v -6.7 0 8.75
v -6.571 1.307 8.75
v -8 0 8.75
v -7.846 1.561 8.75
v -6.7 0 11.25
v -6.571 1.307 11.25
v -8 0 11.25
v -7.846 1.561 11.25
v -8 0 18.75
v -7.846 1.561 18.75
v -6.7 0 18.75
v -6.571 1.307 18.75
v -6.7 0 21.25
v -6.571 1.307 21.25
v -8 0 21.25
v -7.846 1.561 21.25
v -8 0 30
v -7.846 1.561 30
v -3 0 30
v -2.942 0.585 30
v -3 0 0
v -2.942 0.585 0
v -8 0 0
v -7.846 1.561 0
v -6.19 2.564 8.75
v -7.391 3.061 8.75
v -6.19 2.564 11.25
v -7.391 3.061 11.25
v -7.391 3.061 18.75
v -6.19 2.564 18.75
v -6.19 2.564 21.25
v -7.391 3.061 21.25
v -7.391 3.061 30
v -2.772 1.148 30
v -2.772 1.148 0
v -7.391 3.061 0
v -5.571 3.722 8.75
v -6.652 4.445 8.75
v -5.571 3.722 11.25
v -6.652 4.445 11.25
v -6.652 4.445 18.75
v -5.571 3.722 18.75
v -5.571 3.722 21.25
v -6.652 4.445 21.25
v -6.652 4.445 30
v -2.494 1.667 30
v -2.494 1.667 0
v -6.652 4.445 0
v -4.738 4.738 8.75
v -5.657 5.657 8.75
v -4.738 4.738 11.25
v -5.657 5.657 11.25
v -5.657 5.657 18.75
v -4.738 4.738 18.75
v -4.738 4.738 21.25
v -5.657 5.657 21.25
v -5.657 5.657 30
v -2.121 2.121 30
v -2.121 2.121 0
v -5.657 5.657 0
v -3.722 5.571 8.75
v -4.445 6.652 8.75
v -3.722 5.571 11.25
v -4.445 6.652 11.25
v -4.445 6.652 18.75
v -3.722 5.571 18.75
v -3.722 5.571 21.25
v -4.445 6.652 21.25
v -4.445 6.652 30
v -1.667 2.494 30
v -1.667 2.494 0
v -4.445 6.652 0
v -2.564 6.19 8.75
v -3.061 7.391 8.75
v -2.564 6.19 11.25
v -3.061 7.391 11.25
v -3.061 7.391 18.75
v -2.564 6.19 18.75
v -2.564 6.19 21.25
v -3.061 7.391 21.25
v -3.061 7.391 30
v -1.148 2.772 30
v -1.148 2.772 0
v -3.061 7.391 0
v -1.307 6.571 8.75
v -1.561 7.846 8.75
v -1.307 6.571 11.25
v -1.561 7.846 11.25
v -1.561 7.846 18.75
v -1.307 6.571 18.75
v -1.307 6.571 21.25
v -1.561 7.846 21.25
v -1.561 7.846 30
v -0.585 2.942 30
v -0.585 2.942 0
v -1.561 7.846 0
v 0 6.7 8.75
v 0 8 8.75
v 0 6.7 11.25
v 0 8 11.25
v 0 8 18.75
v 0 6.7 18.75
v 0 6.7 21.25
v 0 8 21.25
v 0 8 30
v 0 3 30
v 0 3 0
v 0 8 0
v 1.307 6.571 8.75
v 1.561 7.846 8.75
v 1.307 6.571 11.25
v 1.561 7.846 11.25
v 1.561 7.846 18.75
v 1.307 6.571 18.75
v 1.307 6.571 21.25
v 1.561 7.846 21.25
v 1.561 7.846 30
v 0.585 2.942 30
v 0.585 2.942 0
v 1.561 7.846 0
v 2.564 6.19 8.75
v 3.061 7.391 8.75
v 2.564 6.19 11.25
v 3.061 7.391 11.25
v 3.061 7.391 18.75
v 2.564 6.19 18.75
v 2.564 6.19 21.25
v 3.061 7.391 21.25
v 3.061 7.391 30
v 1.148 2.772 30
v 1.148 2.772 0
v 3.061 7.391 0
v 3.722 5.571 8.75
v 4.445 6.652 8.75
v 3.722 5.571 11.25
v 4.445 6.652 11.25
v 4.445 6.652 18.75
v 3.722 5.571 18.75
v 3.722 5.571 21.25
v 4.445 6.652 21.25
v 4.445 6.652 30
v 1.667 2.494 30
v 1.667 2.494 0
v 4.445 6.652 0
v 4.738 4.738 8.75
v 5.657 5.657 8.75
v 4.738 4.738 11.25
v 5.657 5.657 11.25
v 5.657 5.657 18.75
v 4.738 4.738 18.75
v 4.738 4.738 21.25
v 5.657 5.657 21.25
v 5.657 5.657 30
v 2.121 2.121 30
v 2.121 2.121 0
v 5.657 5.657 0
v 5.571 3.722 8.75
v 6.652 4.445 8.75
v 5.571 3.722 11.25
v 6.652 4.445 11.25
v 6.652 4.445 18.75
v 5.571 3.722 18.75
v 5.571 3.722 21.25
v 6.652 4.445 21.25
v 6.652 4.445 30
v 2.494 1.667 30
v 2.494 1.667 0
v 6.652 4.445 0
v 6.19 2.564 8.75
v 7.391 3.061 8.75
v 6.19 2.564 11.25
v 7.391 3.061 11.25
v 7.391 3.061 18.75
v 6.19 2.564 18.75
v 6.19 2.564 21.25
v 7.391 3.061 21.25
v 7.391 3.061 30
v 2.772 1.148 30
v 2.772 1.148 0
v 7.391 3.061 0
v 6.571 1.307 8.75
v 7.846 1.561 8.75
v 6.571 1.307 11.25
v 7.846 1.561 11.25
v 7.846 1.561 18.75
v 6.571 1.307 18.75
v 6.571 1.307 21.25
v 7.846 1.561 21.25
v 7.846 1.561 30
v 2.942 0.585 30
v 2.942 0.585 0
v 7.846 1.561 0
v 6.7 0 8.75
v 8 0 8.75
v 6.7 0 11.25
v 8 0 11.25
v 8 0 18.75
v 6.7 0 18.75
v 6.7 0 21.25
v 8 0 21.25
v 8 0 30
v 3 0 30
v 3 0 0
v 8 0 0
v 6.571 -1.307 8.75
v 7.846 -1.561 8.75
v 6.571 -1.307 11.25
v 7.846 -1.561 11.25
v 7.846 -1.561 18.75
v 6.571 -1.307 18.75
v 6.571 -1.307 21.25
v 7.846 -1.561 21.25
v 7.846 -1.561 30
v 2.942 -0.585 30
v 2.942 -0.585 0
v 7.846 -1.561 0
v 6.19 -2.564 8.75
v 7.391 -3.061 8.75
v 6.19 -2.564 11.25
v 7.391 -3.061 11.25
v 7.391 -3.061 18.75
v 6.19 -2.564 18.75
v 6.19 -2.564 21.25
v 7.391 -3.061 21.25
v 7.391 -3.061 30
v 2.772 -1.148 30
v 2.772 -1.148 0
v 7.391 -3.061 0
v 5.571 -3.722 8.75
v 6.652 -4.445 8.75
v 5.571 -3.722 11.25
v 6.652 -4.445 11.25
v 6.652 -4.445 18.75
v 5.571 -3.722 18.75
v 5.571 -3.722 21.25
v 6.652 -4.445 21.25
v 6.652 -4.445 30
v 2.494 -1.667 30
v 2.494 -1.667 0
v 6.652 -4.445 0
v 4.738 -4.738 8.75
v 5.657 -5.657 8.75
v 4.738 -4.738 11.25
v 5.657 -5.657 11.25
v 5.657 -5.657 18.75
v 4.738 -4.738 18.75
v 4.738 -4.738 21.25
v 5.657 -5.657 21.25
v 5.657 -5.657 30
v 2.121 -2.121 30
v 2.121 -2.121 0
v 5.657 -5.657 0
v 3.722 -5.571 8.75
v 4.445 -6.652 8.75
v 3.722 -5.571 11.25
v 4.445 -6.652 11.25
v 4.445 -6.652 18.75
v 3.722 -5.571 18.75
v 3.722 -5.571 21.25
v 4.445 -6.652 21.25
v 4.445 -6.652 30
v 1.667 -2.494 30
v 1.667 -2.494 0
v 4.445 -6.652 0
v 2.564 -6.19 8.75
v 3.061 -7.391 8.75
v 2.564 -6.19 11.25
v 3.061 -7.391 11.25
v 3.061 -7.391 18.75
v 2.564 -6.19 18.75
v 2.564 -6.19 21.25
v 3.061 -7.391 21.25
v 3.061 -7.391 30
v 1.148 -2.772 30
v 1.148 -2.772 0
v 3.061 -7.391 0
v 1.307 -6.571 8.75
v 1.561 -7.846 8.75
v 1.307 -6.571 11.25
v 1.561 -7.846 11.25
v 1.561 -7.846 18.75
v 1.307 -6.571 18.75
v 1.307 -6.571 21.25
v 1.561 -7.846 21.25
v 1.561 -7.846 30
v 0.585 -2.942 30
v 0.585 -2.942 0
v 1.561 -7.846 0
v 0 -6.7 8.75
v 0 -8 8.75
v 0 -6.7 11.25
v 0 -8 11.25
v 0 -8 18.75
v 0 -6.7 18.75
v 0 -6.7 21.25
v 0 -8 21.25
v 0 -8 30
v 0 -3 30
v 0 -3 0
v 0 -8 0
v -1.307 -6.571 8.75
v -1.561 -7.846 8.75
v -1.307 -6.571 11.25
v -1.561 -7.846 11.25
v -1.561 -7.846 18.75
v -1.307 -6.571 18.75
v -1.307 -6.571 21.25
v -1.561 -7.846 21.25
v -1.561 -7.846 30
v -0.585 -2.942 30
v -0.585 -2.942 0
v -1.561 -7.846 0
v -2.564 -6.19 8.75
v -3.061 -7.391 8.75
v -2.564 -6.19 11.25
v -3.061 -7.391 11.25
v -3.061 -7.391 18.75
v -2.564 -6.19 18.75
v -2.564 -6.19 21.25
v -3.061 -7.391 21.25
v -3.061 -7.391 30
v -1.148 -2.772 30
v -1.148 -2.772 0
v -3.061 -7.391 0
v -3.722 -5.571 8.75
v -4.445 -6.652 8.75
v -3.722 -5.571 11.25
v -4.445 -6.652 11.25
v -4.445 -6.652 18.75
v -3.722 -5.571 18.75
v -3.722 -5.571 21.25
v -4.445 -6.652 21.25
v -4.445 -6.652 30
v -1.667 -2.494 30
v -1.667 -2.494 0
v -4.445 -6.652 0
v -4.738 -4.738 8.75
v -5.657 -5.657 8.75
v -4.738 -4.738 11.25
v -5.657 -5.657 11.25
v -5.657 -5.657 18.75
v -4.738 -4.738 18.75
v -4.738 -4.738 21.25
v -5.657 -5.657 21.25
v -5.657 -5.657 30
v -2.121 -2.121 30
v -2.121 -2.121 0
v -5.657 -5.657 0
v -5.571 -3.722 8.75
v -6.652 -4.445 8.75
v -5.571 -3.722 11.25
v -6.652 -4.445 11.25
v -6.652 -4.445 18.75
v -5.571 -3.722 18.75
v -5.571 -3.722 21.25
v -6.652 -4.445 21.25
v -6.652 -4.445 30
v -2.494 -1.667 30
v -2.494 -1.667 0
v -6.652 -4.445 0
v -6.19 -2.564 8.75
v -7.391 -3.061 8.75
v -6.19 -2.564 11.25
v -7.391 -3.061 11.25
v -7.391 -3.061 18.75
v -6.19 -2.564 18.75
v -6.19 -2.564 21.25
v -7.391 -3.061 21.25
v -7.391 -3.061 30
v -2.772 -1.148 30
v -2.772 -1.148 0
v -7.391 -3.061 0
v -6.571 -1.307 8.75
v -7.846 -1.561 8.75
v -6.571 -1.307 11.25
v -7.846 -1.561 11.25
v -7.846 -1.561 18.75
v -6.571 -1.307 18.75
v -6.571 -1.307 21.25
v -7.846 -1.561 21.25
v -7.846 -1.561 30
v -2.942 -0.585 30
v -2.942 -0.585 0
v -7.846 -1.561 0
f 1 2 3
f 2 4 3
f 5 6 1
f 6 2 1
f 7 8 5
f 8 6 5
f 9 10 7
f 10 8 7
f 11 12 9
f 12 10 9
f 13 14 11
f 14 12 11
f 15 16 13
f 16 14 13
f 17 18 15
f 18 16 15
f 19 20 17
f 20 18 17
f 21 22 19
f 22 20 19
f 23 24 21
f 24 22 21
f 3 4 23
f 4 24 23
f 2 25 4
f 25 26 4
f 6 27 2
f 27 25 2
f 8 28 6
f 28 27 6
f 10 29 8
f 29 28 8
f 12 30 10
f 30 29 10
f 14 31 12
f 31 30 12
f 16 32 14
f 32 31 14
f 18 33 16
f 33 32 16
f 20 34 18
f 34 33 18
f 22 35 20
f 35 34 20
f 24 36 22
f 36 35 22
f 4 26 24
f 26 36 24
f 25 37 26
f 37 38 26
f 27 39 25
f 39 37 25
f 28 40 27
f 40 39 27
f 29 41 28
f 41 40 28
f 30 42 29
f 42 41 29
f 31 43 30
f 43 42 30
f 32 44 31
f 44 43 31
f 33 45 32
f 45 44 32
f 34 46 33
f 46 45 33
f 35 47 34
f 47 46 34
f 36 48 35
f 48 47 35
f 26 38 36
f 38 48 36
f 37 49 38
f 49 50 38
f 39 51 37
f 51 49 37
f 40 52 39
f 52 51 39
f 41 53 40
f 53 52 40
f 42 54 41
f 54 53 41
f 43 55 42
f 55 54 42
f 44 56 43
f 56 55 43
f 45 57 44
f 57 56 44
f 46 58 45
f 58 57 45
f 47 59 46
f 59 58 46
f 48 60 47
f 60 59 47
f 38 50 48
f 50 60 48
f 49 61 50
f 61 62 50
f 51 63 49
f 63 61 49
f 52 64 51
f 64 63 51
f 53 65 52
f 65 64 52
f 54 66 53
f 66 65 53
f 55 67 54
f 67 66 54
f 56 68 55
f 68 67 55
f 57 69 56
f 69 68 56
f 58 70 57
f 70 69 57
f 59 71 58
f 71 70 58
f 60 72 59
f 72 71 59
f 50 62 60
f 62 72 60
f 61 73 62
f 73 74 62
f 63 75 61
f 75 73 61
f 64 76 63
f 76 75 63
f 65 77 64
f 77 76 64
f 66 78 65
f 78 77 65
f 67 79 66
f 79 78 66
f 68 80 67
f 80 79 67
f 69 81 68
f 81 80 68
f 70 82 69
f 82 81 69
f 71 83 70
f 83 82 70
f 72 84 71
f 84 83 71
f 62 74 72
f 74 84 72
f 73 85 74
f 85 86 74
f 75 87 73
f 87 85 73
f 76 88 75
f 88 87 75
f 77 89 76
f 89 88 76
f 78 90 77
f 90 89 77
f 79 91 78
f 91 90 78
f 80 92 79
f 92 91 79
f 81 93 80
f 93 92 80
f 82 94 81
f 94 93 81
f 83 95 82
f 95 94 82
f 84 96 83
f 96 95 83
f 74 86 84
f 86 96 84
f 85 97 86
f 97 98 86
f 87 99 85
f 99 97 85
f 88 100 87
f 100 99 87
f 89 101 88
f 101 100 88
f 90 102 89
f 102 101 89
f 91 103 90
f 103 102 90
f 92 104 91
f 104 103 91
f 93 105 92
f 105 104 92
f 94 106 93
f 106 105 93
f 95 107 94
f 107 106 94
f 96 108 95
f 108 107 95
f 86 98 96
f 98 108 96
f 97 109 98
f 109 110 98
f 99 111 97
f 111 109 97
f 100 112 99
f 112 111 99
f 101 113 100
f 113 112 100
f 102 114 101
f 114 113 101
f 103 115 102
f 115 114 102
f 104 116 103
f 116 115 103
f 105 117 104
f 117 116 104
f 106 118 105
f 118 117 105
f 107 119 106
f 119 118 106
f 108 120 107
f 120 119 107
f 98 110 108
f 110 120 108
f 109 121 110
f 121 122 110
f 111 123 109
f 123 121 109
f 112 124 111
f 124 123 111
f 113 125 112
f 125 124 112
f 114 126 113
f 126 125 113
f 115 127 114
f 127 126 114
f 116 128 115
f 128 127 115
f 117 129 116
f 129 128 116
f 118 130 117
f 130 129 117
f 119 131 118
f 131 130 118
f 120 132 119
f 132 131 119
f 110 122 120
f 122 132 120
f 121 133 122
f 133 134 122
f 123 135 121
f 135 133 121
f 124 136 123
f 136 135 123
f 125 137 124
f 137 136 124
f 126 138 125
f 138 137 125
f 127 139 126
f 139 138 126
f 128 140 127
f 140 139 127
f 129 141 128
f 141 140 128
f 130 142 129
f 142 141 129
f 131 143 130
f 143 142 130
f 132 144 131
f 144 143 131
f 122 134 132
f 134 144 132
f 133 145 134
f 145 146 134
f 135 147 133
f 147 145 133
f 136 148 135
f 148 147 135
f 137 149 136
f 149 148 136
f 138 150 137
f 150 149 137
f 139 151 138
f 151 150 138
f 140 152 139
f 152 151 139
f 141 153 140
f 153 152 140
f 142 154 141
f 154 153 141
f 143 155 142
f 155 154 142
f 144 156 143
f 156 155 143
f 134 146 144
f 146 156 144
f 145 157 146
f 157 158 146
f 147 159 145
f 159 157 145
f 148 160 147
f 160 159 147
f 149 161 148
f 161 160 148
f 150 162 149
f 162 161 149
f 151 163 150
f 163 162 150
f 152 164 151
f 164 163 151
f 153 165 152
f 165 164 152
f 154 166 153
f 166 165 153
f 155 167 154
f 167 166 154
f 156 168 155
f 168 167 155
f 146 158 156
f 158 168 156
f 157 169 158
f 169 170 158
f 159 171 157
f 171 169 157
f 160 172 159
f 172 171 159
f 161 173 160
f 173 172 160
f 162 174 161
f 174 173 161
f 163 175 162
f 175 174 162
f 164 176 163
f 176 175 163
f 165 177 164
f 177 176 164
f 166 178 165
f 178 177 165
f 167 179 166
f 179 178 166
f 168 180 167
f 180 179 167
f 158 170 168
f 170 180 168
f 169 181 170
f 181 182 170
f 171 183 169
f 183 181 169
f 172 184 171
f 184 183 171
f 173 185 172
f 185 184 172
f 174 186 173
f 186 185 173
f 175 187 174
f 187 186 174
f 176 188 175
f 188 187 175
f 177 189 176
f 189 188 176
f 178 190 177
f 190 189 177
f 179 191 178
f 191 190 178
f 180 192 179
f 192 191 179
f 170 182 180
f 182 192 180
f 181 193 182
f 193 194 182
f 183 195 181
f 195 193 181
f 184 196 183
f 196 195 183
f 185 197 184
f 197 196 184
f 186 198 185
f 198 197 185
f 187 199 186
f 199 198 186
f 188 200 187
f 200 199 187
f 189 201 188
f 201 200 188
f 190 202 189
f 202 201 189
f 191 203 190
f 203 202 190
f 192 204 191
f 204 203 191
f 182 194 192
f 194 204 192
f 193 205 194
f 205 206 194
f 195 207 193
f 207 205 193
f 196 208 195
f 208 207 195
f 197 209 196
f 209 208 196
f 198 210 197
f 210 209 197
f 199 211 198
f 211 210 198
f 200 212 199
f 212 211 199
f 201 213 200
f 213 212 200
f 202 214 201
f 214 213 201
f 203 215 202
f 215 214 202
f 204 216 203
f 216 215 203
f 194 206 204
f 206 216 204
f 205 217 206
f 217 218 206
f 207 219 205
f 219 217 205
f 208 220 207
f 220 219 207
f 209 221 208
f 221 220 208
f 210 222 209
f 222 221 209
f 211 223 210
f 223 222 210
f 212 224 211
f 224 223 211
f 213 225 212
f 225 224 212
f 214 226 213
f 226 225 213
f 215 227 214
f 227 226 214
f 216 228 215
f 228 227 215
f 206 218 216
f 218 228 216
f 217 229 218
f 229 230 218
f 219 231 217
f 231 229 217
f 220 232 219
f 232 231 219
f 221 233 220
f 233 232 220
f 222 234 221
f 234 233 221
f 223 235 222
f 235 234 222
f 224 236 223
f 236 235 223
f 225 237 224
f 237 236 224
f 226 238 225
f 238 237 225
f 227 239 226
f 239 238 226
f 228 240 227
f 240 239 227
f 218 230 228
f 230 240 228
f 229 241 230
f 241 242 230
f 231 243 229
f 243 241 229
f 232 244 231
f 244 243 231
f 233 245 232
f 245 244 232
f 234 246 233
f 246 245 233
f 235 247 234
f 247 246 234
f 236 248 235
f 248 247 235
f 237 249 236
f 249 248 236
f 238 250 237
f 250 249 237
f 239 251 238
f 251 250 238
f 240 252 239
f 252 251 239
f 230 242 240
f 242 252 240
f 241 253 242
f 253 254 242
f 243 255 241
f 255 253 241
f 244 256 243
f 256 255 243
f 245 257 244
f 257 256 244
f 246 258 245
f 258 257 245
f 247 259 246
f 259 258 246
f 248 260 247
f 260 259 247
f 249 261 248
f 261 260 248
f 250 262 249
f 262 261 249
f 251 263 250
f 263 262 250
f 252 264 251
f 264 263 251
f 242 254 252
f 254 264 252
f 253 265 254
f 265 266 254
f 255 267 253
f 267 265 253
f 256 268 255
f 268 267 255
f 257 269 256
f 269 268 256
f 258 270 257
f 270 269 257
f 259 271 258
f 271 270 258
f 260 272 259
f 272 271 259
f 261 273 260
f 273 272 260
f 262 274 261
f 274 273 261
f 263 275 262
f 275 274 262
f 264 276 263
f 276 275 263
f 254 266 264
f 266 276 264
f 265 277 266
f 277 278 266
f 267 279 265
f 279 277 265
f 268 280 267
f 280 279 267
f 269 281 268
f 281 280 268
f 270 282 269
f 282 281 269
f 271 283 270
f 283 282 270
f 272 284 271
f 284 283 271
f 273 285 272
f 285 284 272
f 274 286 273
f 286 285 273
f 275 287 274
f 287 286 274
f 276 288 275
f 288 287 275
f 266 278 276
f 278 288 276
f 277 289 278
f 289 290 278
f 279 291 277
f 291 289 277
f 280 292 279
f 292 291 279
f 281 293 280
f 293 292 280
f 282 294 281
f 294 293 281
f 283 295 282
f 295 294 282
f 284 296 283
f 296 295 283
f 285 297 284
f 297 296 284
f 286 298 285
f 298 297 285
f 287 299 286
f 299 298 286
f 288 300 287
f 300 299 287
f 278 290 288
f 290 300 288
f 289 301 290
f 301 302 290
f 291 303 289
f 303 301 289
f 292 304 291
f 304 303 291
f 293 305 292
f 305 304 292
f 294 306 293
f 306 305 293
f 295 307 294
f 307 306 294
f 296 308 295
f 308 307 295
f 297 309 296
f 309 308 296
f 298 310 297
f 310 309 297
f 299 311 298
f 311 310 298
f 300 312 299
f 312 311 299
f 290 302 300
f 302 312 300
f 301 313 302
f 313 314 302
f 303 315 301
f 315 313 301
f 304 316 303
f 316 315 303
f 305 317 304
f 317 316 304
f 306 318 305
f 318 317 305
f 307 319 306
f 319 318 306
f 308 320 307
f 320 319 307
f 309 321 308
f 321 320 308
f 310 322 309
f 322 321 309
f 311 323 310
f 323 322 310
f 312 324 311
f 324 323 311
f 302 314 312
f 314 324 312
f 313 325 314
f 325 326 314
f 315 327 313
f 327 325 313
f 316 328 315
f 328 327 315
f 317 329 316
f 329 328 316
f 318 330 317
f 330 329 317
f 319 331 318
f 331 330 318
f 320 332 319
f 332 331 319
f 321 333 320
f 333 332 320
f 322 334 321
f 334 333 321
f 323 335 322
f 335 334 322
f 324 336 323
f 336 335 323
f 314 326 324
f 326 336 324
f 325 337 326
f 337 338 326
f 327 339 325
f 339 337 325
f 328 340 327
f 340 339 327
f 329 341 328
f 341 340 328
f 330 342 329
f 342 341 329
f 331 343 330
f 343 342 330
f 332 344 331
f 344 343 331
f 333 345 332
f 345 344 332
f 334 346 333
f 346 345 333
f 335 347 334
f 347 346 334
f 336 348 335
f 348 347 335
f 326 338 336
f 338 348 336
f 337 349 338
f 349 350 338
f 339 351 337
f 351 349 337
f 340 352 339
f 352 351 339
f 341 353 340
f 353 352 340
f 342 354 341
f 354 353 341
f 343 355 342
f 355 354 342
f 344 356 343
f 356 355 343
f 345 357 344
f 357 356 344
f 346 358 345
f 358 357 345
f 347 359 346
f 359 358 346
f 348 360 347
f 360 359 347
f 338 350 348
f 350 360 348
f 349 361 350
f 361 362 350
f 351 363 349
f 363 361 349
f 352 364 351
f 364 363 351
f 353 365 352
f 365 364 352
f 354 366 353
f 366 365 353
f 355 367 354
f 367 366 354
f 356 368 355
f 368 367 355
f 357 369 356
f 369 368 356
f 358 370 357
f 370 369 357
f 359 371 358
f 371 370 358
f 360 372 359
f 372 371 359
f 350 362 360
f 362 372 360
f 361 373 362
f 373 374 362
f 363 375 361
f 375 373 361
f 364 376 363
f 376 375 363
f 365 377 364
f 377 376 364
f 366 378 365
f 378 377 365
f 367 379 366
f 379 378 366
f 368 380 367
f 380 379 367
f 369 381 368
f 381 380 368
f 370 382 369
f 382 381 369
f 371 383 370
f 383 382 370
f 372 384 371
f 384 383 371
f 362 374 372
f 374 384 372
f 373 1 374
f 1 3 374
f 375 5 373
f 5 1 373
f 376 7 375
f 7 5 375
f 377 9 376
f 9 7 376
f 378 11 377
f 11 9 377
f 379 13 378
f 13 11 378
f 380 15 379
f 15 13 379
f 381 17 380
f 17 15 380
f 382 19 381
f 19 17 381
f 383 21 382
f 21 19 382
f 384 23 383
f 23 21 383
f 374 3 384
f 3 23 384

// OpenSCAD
$fn = 32;

// ----------------------------------------------------------------------
// Grooved revolve: stepped, bore R3
// ----------------------------------------------------------------------

// --- parameters (mm) ---
bore_r = 3;               // bore radius
outer_r = 8;              // outer radius of the body
total_h = 30;             // overall height, Z
wall = 5;                 // radial wall thickness
groove_w = 2.5;           // groove width
groove_d = 1.3;           // groove depth
grooves = 2;              // number of outer grooves

bbox_x = 2 * outer_r;  // full diameter
bore_d = 2 * bore_r;  // bore diameter
body_d = 2 * outer_r;  // body diameter
revolve_angle = 360;  // full turn around the Z axis

profile = [[3, 0], [8, 0], [8, 8.75], [6.7, 8.75], [6.7, 11.25], [8, 11.25], [8, 18.75], [6.7, 18.75], [6.7, 21.25], [8, 21.25], [8, 30], [3, 30]];  // primary outline, 12 points, counter clockwise

// --- the one profile operation ---
rotate_extrude(angle = revolve_angle) polygon(points = profile);
